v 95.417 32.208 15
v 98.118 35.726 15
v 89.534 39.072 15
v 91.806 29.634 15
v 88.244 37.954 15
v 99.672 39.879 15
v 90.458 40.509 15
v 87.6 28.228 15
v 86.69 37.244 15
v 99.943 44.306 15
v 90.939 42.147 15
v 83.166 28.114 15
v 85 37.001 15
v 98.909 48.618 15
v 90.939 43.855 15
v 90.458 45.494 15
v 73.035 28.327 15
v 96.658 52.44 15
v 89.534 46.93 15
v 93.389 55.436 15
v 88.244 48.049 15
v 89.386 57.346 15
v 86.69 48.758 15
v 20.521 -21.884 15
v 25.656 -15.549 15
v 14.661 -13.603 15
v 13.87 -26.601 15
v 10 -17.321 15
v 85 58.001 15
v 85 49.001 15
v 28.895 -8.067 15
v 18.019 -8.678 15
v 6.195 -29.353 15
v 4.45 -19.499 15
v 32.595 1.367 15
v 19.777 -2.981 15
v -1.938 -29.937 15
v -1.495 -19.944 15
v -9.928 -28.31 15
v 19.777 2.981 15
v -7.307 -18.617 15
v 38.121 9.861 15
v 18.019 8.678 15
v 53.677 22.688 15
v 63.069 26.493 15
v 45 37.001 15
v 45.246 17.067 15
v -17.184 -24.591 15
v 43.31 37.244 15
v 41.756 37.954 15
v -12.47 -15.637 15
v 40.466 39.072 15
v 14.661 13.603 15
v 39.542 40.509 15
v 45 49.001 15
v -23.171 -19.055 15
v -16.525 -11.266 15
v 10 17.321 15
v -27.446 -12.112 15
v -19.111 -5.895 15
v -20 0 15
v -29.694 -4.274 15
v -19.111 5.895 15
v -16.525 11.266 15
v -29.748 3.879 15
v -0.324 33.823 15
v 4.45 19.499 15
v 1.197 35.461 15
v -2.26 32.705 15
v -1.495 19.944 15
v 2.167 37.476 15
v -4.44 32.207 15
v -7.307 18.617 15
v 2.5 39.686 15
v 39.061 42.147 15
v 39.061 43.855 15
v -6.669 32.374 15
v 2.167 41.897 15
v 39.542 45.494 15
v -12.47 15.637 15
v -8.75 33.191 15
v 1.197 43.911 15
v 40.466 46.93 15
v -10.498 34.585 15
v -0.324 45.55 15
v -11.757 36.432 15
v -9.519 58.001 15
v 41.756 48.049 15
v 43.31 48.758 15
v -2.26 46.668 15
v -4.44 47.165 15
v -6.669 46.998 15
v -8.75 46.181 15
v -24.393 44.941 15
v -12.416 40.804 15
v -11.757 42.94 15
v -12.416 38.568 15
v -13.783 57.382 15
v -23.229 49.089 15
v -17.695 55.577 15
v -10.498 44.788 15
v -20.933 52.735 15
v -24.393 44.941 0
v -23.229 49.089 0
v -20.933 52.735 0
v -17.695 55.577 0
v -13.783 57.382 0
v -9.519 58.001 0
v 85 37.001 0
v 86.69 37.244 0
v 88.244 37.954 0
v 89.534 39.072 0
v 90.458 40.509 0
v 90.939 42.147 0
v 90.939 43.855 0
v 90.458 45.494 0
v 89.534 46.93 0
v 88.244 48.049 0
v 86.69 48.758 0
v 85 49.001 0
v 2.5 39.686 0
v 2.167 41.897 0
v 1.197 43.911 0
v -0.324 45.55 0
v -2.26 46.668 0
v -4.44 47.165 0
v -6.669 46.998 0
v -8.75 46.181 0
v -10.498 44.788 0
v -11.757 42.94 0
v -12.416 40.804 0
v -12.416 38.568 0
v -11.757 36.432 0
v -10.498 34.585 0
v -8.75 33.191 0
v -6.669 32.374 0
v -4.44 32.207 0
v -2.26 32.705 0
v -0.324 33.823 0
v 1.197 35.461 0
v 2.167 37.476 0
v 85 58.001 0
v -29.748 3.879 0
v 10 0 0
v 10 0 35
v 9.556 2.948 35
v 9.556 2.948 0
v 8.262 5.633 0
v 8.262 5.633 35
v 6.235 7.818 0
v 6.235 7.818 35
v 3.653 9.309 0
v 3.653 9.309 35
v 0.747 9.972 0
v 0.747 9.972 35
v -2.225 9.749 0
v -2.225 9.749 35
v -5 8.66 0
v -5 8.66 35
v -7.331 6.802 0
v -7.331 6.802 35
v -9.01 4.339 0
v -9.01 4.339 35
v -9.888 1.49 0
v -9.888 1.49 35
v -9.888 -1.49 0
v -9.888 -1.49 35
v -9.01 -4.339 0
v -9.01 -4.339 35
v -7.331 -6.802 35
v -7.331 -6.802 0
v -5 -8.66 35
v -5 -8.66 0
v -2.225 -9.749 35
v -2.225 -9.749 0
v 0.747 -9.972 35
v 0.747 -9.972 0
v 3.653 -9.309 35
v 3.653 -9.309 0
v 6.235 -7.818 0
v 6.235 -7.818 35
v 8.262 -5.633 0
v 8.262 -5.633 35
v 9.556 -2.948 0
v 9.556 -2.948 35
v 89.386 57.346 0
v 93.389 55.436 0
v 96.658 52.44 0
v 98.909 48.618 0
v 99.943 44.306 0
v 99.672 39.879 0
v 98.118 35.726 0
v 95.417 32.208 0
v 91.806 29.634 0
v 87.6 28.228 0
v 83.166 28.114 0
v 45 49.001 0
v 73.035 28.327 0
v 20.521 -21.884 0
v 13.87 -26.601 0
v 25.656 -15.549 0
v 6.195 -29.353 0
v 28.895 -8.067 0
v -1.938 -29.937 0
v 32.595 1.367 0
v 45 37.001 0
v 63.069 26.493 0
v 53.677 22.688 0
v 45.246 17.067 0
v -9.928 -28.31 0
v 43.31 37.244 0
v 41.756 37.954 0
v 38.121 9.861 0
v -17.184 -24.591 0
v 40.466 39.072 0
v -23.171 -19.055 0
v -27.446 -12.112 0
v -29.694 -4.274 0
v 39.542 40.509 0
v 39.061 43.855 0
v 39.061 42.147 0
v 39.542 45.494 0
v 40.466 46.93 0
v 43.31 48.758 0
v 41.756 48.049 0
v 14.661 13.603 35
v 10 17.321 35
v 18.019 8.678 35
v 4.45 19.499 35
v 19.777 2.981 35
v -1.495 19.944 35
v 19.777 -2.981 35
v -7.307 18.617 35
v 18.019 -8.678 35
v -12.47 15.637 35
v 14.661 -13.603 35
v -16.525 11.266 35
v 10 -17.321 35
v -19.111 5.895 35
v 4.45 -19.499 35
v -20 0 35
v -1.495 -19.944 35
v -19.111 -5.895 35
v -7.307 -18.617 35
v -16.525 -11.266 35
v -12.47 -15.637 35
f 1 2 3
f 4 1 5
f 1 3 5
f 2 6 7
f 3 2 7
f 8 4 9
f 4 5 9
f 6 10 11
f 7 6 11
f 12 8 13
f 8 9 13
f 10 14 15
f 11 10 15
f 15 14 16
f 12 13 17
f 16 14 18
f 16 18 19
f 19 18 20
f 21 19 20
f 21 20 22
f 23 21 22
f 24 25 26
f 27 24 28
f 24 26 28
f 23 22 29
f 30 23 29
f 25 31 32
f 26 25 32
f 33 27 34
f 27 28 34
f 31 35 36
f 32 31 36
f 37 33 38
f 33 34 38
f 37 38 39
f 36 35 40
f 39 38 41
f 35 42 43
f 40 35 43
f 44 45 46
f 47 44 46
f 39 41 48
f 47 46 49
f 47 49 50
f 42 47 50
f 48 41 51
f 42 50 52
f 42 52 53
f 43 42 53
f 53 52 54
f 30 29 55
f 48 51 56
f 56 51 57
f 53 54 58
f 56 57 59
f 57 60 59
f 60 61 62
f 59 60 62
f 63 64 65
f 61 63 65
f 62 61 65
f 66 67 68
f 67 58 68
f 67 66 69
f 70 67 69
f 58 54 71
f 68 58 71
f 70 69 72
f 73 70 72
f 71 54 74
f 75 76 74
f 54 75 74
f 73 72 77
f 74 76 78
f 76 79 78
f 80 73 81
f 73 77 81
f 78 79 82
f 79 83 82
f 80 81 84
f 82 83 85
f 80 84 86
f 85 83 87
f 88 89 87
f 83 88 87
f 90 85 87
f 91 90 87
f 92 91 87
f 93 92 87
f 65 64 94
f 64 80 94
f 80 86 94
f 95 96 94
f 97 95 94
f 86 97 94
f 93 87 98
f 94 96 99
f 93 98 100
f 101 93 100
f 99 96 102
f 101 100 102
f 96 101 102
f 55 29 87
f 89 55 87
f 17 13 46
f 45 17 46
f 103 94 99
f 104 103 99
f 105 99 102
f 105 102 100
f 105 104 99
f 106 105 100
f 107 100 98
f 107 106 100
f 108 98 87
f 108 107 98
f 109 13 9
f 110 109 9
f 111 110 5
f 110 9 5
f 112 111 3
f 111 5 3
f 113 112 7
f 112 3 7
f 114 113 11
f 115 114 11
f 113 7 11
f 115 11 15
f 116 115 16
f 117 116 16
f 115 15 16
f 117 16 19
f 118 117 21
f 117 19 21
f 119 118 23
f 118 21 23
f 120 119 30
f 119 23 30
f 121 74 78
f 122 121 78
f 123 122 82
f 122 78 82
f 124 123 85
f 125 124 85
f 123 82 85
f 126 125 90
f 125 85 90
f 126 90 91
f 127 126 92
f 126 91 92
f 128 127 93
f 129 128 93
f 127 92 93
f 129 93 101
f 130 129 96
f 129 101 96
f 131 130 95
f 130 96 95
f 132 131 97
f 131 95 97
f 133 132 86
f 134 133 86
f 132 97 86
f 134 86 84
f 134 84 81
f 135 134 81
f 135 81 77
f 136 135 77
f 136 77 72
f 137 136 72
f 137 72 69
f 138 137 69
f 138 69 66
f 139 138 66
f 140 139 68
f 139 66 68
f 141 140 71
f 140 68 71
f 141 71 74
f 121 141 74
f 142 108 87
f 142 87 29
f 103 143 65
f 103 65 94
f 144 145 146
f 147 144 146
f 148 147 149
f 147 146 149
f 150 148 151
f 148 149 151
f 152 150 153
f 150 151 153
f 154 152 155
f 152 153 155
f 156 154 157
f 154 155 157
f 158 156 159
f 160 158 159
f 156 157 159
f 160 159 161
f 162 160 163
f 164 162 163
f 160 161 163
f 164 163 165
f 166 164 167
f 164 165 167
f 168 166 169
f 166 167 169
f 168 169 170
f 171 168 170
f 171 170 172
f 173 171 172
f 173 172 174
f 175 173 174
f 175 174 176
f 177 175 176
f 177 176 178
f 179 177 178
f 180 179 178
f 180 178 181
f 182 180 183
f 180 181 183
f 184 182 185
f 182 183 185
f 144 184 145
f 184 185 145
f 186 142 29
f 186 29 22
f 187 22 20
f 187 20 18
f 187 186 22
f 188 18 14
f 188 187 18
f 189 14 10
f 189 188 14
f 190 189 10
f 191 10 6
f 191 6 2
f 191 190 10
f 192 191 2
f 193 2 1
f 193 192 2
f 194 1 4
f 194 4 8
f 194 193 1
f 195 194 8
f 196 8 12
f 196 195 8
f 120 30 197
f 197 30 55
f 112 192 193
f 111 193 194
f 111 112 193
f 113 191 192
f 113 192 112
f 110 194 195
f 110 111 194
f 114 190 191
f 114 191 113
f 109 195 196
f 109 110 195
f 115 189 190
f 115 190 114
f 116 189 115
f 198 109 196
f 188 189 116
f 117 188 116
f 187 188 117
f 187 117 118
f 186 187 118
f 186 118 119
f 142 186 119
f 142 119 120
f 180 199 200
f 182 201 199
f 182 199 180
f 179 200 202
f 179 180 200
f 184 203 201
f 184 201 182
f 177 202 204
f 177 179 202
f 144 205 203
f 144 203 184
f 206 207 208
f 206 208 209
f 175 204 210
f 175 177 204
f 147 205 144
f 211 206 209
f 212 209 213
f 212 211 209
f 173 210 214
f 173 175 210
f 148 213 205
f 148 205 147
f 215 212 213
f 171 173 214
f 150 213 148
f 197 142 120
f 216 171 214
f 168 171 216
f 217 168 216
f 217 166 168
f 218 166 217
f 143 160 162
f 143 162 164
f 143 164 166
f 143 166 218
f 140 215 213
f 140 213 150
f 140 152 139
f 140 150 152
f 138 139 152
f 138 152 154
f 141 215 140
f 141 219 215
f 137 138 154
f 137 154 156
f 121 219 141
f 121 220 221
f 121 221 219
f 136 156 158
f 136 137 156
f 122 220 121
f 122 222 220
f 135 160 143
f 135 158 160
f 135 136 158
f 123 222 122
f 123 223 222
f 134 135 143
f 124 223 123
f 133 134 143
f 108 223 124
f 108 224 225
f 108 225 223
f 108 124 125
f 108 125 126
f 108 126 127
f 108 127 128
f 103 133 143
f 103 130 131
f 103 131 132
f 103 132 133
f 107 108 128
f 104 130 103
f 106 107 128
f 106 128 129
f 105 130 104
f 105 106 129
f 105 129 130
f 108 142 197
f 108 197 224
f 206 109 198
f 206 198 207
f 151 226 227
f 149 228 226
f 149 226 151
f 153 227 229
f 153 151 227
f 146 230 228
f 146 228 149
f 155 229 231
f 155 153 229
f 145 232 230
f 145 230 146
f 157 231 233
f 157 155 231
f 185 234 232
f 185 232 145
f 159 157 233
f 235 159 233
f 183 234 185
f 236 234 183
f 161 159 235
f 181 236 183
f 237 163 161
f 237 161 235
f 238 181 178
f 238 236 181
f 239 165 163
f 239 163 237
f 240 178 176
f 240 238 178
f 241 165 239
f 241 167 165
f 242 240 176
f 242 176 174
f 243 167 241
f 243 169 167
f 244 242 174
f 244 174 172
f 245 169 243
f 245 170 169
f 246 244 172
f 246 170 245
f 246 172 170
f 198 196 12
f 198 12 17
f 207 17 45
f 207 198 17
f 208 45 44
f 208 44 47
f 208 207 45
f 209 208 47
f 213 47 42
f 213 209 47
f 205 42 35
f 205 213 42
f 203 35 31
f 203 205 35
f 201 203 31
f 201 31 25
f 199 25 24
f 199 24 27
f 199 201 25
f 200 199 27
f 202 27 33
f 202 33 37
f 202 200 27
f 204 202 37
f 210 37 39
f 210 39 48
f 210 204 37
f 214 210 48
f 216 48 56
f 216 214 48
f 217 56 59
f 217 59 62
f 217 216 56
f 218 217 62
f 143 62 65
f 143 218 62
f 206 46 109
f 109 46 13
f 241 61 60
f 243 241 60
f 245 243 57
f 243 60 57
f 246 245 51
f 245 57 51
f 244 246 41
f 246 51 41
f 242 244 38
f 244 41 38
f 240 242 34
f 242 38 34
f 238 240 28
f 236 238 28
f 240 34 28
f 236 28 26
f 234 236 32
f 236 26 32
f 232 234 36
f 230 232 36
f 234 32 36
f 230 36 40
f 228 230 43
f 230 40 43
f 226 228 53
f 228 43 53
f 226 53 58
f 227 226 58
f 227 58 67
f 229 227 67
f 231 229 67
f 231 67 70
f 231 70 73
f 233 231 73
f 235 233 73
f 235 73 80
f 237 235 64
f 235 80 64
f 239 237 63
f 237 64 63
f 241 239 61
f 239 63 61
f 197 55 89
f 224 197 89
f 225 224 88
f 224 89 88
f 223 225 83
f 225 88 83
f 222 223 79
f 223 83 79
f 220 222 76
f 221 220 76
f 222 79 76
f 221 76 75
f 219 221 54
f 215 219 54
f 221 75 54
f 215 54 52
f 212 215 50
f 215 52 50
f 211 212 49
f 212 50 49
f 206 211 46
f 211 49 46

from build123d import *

# Parameters (mm, degrees)
BOSS_EXTRUDE1_DEPTH = 15
SKETCH2_R           = 7.5
CUT_EXTRUDE1_DEPTH  = 15
SKETCH3_R           = 20
BOSS_EXTRUDE2_DEPTH = 20
SKETCH4_R           = 10
CUT_EXTRUDE2_DEPTH  = 35


with BuildPart() as part:
    # Sketch1 → Boss-Extrude1 (new body)
    with BuildSketch(Plane.XY):
        with BuildLine():
            Line((-29.748120578, 3.87934557), (-24.393431116, 44.940897042))
            ThreePointArc((-24.393431116, 44.940897042), (-19.416464042, 54.272761237), (-9.519370827, 58.001224257))
            Line((-9.519370827, 58.001224257), (85, 58.001224257))
            ThreePointArc((85, 58.001224257), (99.971845495, 42.082615269), (83.166230421, 28.113736587))
            ThreePointArc((83.166230421, 28.113736587), (49.31881051, 20.091395843), (28.895124435, -8.066708368))
            ThreePointArc((28.895124435, -8.066708368), (-5.988234446, -29.396276095), (-29.748120578, 3.87934557))
        make_face()
    extrude(amount=BOSS_EXTRUDE1_DEPTH)

    # Sketch2 → Cut-Extrude1 (cut)
    with BuildSketch(Plane.XY.offset(15)):
        with BuildLine():
            Line((45, 37.001224257), (85, 37.001224257))
            ThreePointArc((85, 37.001224257), (91, 43.001224257), (85, 49.001224257))
            Line((85, 49.001224257), (45, 49.001224257))
            ThreePointArc((45, 49.001224257), (39, 43.001224257), (45, 37.001224257))
        make_face()
        with Locations((-5, 39.686269666)):
            Circle(SKETCH2_R)
    extrude(amount=-CUT_EXTRUDE1_DEPTH, mode=Mode.SUBTRACT)

    # Sketch3 → Boss-Extrude2 (add)
    with BuildSketch(Plane.XY.offset(15)):
        Circle(SKETCH3_R)
    extrude(amount=BOSS_EXTRUDE2_DEPTH)

    # Sketch4 → Cut-Extrude2 (cut)
    with BuildSketch(Plane.XY.offset(35)):
        Circle(SKETCH4_R)
    extrude(amount=-CUT_EXTRUDE2_DEPTH, mode=Mode.SUBTRACT)


solid = part.part
